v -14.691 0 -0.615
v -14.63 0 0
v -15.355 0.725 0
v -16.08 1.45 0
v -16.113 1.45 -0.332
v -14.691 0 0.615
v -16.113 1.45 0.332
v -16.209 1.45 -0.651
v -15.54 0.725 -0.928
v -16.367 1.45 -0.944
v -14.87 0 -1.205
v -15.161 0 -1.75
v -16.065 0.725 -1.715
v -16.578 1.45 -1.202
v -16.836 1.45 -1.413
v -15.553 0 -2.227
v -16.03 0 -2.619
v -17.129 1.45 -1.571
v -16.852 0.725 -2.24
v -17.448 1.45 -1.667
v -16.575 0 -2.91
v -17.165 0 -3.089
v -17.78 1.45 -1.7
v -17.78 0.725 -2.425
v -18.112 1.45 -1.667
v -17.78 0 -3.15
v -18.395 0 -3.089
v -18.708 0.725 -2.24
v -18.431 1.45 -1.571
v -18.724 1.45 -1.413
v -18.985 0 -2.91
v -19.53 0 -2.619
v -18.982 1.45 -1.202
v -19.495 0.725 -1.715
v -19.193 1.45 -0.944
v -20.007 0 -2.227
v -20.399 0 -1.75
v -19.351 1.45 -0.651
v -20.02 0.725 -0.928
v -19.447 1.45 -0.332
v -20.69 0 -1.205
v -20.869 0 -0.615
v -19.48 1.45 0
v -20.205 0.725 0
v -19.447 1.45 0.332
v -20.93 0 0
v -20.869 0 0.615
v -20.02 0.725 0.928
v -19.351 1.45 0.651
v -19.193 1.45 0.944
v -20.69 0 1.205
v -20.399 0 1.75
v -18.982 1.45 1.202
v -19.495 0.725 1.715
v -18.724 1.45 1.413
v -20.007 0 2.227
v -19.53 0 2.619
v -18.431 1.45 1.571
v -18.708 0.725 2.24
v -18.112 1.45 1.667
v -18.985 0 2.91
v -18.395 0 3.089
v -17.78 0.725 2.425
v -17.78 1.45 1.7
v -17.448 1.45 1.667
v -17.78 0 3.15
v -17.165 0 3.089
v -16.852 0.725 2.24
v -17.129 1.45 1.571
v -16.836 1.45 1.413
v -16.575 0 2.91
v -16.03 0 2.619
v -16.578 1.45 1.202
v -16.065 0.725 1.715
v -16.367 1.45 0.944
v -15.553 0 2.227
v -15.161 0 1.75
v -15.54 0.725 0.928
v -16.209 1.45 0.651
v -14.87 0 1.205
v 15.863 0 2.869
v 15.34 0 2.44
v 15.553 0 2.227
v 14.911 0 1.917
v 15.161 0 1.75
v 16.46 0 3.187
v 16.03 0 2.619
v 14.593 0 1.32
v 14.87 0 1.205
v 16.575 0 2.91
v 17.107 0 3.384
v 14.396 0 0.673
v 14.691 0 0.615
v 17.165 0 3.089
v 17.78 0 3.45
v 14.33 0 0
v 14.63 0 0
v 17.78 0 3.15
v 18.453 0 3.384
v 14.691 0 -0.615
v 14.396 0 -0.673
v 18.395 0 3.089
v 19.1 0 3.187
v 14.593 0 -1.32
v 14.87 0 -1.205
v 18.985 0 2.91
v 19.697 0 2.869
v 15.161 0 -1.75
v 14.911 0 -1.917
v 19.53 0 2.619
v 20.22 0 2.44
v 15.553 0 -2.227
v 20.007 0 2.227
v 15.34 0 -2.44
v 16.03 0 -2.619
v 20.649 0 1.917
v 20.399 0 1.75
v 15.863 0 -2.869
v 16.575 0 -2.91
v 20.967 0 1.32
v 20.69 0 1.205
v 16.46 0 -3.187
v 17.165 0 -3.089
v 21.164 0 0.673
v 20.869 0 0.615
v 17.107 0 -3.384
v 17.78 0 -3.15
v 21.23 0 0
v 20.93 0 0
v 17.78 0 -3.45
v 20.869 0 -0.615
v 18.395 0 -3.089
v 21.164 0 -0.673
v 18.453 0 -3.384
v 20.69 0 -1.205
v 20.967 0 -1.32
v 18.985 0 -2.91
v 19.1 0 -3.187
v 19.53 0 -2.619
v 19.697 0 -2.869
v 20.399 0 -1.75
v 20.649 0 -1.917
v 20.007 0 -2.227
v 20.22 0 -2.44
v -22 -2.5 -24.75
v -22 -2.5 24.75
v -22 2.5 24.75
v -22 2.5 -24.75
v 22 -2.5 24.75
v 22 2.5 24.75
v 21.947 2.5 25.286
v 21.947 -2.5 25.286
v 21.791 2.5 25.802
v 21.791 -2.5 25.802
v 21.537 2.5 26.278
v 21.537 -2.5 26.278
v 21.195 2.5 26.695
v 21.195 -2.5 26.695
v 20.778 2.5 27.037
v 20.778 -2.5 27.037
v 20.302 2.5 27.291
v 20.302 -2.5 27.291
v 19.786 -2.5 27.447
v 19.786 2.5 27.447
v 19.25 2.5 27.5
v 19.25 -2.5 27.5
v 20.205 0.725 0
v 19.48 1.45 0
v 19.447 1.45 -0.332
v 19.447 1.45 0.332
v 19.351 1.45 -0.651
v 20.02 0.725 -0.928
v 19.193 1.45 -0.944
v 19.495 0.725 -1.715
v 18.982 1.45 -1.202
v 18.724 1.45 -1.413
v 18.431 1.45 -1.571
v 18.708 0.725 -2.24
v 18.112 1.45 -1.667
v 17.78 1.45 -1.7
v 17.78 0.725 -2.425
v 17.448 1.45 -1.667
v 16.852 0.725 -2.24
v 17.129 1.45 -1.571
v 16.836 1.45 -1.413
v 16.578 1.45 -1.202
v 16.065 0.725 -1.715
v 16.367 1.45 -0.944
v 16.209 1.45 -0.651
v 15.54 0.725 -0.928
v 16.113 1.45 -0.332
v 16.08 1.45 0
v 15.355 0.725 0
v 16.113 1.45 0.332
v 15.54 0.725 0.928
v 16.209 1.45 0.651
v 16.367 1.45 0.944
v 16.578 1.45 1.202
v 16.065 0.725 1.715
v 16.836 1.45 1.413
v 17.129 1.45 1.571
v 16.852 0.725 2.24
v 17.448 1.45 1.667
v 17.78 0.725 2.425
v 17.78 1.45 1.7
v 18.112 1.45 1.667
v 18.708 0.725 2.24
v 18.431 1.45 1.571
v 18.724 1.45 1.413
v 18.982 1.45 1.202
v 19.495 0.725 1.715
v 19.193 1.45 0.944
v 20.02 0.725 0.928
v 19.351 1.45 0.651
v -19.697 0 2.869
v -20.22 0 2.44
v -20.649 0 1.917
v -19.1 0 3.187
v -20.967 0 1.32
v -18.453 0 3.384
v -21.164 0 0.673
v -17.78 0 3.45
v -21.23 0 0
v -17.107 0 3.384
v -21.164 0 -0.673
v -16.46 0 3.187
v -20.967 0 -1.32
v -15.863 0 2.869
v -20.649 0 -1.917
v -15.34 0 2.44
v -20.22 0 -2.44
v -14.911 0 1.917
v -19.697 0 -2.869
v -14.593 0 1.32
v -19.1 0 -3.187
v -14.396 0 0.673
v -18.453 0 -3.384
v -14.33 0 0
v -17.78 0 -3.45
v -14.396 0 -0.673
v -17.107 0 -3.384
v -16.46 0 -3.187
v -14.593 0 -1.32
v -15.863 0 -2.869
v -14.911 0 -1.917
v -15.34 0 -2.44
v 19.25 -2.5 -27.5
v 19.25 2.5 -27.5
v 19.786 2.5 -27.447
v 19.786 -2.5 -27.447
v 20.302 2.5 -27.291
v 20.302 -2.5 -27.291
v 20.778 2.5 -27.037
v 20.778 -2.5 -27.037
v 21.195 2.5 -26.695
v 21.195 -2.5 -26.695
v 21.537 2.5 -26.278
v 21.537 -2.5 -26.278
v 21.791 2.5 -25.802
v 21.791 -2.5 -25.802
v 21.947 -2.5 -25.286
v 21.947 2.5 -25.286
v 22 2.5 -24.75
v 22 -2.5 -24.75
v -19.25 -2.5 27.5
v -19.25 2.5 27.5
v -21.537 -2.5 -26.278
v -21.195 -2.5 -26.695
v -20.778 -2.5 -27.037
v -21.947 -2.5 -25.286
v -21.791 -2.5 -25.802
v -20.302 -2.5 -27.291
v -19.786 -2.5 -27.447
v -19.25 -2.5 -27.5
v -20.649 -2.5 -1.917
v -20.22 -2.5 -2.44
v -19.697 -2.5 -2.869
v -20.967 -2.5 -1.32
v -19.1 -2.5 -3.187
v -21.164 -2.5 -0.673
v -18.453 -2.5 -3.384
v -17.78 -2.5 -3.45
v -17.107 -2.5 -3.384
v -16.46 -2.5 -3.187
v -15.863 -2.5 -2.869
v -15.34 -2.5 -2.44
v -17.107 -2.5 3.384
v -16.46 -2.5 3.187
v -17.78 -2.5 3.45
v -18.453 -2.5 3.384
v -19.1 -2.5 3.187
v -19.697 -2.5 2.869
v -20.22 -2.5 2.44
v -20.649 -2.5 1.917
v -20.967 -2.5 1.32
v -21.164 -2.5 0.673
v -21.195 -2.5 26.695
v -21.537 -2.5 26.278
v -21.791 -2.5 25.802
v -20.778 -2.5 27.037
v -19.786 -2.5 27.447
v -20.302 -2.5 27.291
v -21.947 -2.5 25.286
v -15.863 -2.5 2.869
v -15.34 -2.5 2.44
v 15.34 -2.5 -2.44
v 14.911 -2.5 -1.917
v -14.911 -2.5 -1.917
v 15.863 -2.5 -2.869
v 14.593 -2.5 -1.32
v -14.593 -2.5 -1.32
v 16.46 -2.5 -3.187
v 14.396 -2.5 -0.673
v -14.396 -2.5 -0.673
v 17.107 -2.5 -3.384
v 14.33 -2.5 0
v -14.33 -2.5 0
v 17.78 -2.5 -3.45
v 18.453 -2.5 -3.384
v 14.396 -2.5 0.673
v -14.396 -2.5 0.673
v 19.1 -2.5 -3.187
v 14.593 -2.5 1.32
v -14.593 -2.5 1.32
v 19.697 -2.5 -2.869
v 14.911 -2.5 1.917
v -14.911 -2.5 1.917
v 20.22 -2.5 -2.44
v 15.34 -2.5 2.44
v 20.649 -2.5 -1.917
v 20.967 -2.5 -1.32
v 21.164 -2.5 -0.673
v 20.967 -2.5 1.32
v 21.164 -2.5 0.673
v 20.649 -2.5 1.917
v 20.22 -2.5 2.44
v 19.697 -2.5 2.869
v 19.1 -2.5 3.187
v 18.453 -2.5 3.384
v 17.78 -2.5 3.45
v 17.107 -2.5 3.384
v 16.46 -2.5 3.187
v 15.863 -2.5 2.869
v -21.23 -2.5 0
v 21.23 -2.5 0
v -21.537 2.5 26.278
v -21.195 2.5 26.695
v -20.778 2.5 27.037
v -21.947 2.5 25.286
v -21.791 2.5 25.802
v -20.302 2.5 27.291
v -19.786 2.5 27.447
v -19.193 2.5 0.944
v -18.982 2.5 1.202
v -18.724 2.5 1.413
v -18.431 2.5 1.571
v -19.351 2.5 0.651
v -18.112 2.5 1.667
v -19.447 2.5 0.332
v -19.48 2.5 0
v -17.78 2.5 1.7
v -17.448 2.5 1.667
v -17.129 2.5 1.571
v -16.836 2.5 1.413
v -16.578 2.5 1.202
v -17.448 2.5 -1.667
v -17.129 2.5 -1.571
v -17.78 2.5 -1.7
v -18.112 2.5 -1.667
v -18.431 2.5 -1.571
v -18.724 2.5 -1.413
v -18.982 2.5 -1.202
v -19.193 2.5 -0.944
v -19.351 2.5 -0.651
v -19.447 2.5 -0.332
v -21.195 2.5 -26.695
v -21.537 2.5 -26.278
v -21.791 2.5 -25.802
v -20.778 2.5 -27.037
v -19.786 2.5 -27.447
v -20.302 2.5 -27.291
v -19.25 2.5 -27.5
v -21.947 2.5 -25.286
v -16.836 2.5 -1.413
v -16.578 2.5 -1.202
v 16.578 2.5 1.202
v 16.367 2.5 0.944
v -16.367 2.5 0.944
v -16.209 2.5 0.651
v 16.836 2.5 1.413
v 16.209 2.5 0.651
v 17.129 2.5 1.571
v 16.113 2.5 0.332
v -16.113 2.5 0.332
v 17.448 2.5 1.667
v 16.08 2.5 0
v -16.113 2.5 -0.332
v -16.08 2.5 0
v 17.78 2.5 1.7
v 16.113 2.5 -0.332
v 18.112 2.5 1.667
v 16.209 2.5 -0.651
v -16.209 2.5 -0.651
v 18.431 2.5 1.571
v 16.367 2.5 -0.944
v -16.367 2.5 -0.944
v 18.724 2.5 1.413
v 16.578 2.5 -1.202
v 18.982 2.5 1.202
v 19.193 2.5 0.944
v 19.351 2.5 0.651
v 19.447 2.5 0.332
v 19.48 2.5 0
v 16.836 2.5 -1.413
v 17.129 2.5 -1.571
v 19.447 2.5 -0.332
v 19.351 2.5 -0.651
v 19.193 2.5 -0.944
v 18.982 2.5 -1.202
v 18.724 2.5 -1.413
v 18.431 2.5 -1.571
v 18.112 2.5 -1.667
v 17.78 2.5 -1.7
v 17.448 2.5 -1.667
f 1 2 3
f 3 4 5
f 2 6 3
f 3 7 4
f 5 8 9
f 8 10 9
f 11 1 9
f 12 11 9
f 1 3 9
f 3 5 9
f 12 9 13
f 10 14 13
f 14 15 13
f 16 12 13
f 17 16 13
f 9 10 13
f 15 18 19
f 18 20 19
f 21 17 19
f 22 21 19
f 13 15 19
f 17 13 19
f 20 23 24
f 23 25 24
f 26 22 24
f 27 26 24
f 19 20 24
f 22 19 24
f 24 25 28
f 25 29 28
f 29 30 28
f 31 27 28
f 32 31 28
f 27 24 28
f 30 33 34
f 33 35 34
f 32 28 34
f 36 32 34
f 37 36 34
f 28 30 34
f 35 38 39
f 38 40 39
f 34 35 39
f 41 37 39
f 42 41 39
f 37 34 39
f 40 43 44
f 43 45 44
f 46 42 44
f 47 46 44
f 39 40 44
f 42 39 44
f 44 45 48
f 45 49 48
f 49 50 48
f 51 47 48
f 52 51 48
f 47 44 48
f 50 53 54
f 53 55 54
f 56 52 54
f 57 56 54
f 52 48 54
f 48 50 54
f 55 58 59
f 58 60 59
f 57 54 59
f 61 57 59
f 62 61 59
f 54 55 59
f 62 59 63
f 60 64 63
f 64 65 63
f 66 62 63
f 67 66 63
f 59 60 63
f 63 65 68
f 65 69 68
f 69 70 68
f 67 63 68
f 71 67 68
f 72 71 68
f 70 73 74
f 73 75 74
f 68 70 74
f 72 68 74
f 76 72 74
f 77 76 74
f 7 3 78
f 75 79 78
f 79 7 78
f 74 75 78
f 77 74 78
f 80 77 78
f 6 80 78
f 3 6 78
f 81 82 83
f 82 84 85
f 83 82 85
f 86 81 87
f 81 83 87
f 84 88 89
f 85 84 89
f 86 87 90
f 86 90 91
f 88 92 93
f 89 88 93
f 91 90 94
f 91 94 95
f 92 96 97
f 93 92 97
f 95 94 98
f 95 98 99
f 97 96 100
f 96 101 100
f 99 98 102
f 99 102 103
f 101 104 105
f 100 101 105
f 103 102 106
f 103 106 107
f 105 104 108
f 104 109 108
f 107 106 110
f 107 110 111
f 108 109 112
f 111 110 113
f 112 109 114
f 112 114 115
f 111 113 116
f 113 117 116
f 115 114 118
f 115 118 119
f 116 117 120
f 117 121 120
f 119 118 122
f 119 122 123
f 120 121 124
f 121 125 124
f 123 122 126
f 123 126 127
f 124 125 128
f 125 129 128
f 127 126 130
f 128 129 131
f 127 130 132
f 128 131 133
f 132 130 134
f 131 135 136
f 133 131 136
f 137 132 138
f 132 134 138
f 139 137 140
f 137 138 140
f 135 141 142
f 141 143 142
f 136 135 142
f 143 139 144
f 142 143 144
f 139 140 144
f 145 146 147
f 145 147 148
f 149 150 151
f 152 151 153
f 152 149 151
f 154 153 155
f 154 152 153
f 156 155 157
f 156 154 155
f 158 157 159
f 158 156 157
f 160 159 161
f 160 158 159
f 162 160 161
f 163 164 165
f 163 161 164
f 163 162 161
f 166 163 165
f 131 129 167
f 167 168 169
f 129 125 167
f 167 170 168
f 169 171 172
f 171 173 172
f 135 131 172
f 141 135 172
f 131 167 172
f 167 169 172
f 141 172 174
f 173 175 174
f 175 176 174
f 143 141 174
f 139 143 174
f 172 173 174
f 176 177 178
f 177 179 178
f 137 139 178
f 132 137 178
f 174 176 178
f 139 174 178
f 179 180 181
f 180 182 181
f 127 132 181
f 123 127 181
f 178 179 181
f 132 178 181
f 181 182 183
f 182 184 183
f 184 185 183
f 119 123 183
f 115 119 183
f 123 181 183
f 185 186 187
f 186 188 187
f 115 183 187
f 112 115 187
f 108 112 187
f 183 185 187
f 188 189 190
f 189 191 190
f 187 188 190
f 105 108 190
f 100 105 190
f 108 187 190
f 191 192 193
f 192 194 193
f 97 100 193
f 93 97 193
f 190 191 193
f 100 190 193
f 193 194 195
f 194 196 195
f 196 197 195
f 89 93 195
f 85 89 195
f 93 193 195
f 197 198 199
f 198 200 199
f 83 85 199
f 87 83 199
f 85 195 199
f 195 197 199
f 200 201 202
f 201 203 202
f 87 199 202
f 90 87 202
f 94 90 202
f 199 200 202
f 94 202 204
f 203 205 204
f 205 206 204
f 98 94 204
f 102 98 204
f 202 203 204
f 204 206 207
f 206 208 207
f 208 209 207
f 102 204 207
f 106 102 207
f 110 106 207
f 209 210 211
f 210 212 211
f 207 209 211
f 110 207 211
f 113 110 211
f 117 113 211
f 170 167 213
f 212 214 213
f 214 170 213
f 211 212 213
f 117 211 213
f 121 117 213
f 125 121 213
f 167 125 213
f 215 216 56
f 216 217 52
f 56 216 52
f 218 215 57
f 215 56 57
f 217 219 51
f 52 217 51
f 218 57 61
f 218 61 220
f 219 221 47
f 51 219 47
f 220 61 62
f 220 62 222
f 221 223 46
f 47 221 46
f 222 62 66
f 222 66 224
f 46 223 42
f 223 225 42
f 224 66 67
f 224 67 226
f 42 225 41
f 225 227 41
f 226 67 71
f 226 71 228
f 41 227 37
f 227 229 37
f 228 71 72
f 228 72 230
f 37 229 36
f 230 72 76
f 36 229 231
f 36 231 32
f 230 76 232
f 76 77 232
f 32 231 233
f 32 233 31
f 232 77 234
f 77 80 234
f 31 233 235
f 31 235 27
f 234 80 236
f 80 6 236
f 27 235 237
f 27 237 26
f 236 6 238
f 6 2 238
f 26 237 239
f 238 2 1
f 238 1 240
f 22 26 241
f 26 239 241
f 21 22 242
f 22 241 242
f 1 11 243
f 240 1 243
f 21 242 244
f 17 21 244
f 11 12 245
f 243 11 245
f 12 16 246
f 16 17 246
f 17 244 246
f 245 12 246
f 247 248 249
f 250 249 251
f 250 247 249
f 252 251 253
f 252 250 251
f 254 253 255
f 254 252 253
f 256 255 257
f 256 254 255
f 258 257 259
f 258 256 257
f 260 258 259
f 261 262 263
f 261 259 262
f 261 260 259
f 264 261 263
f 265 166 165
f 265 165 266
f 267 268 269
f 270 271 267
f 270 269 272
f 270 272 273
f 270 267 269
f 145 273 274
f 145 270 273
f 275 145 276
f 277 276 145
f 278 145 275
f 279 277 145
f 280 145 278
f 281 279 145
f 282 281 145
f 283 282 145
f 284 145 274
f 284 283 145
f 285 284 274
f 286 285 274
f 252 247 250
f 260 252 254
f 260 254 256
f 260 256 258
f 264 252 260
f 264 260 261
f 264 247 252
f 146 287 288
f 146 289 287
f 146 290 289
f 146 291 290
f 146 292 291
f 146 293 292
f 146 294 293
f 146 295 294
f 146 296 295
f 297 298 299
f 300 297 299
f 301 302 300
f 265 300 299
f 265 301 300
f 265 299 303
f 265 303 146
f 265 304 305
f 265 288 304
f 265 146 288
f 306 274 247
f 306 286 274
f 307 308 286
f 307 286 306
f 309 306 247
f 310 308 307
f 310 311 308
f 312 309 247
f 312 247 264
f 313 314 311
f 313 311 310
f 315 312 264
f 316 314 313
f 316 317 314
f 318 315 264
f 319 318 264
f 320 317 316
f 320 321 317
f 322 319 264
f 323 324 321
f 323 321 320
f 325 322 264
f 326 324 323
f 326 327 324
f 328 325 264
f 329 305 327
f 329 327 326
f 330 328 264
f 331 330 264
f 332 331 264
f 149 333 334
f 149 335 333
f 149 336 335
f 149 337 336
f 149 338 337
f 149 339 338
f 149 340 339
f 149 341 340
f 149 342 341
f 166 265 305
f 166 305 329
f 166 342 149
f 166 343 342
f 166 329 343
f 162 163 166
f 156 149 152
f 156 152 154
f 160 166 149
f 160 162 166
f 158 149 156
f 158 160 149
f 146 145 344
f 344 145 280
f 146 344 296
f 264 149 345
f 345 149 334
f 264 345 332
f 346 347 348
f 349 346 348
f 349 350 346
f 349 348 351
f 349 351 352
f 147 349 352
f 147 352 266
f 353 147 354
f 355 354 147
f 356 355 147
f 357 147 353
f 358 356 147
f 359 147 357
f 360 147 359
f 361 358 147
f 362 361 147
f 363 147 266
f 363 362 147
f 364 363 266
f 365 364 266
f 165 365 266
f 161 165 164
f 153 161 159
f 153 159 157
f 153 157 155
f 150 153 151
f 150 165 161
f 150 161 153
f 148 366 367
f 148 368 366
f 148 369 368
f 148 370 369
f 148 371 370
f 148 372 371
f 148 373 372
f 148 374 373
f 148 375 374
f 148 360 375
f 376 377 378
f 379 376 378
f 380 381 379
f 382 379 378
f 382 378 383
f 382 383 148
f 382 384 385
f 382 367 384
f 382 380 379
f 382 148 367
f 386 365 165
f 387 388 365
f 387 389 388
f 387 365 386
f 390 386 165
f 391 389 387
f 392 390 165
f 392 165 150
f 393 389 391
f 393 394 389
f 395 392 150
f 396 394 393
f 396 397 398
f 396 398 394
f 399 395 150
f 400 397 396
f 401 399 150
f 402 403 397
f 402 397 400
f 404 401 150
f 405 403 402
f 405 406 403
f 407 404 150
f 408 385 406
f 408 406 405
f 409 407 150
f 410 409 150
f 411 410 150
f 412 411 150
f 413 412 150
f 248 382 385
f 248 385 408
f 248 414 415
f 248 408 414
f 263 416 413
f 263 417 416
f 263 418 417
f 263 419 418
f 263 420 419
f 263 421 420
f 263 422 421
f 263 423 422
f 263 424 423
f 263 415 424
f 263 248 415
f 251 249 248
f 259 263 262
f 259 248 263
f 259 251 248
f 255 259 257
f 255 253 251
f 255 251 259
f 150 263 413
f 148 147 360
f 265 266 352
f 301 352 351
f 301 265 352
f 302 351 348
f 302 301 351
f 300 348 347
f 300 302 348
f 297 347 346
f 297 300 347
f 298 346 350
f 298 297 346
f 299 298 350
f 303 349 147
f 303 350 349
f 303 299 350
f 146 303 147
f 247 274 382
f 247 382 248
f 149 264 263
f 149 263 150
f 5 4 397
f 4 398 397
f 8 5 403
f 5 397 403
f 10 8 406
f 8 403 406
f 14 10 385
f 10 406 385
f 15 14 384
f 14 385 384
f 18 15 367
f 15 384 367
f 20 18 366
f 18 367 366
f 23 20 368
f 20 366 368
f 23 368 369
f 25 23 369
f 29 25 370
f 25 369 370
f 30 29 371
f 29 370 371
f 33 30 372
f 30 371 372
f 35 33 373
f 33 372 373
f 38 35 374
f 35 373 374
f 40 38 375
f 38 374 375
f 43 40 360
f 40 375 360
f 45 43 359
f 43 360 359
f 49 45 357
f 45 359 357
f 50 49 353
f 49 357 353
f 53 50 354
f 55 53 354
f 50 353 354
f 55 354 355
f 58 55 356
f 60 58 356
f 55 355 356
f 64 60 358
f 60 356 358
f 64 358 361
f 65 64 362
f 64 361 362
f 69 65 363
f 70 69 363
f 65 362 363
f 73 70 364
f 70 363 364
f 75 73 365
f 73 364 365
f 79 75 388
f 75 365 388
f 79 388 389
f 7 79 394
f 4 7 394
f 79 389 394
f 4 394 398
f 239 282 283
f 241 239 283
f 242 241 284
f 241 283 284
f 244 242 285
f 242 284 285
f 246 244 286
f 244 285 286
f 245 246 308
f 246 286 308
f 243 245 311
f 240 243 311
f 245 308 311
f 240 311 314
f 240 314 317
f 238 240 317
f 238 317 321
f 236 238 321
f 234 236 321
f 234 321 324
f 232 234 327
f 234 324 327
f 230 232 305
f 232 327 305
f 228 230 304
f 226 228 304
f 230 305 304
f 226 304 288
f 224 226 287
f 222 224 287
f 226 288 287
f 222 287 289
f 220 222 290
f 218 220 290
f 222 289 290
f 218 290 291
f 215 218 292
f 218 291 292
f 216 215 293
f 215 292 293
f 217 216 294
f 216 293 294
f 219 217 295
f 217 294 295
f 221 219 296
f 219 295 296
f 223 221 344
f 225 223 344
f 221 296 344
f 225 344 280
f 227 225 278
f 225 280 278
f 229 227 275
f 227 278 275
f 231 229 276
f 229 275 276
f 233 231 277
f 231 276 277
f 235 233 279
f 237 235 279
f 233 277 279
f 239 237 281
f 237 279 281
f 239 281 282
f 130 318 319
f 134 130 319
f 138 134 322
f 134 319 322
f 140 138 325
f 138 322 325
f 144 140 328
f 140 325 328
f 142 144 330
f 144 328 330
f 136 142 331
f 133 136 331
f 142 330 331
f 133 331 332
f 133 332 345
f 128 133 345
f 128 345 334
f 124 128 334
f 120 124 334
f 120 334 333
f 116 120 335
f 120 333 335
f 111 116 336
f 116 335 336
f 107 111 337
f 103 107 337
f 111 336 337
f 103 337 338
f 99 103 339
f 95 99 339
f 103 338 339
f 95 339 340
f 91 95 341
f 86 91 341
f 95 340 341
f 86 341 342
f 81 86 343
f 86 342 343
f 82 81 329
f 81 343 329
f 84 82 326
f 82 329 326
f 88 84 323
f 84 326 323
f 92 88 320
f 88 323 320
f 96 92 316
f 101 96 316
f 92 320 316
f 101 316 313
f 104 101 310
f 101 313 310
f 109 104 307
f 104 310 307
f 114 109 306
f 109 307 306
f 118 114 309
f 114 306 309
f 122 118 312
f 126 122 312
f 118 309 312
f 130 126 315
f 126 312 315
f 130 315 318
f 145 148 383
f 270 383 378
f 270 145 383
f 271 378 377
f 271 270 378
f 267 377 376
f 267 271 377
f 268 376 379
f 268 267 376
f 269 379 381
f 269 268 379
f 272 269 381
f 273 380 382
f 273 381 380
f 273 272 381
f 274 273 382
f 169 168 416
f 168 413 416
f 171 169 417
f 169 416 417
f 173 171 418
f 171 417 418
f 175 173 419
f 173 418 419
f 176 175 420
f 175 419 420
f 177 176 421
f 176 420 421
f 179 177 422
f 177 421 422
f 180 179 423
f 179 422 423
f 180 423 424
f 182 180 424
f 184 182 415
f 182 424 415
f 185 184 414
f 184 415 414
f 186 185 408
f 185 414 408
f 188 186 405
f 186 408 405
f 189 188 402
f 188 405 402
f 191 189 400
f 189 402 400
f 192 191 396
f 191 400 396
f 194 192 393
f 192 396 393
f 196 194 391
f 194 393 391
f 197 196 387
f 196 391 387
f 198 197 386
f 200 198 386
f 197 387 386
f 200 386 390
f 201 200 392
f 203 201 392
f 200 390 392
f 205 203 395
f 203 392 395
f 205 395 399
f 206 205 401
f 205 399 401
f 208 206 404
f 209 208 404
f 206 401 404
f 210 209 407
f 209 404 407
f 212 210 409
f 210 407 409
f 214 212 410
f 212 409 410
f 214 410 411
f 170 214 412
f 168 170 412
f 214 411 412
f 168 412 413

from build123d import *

# Parameters (mm, degrees)
SKETCH1_R                                       = 1.5
BOSS_EXTRUDE1_DEPTH                             = 2.5
CSK_FOR_M3_FLAT_HEAD_MACHINE_SCREW1_D           = 3.4
CSK_FOR_M3_FLAT_HEAD_MACHINE_SCREW1_DEPTH       = 10
CSK_FOR_M3_FLAT_HEAD_MACHINE_SCREW1_CSINK_D     = 6.3
CSK_FOR_M3_FLAT_HEAD_MACHINE_SCREW1_CSINK_ANGLE = 90
CSK_FOR_M3_FLAT_HEAD_MACHINE_SCREW1_TIP         = 1.021463052
BOSS_EXTRUDE2_START                             = 2.5
SKETCH4_R                                       = 3.45
BOSS_EXTRUDE2_DEPTH                             = 2.5


with BuildPart() as part:
    # Sketch1 → Boss-Extrude1 (new body)
    with BuildSketch(Plane(origin=(0, 0, 0), x_dir=(1, 0, 0), z_dir=(0, 1, 0))):
        with BuildLine():
            Line((-19.25, -27.5), (19.25, -27.5))
            ThreePointArc((19.25, -27.5), (21.194543648, -26.694543648), (22, -24.75))
            Line((22, -24.75), (22, 24.75))
            ThreePointArc((22, 24.75), (21.194543648, 26.694543648), (19.25, 27.5))
            Line((19.25, 27.5), (-19.25, 27.5))
            ThreePointArc((-19.25, 27.5), (-21.194543648, 26.694543648), (-22, 24.75))
            Line((-22, 24.75), (-22, -24.75))
            ThreePointArc((-22, -24.75), (-21.194543648, -26.694543648), (-19.25, -27.5))
        make_face()
        with Locations(Location((-17.78, 0, 0), (0, 0, 270))):
            Circle(SKETCH1_R, mode=Mode.SUBTRACT)
        with Locations(Location((17.78, 0, 0), (0, 0, 90))):
            Circle(SKETCH1_R, mode=Mode.SUBTRACT)
    extrude(amount=BOSS_EXTRUDE1_DEPTH)

    # CSK for M3 Flat Head Machine Screw1
    with Locations(Plane(origin=(0, 0, 0), x_dir=(-1, 0, 0), z_dir=(0, -1, 0))):
        with Locations((-17.78, 0), (17.78, 0)):
            CounterSinkHole(CSK_FOR_M3_FLAT_HEAD_MACHINE_SCREW1_D / 2, CSK_FOR_M3_FLAT_HEAD_MACHINE_SCREW1_CSINK_D / 2, depth=CSK_FOR_M3_FLAT_HEAD_MACHINE_SCREW1_DEPTH, counter_sink_angle=CSK_FOR_M3_FLAT_HEAD_MACHINE_SCREW1_CSINK_ANGLE)
            with Locations((0, 0, -(CSK_FOR_M3_FLAT_HEAD_MACHINE_SCREW1_DEPTH + CSK_FOR_M3_FLAT_HEAD_MACHINE_SCREW1_TIP / 2))):  # 118° drill point
                Cone(0, CSK_FOR_M3_FLAT_HEAD_MACHINE_SCREW1_D / 2, CSK_FOR_M3_FLAT_HEAD_MACHINE_SCREW1_TIP, mode=Mode.SUBTRACT)

    # Sketch4 → Boss-Extrude2 (add)
    with BuildSketch(Plane.XZ.offset(BOSS_EXTRUDE2_START)):
        with BuildLine():
            Line((-22, 24.75), (-22, -24.75))
            ThreePointArc((-22, -24.75), (-21.194543648, -26.694543648), (-19.25, -27.5))
            Line((-19.25, -27.5), (19.25, -27.5))
            ThreePointArc((19.25, -27.5), (21.194543648, -26.694543648), (22, -24.75))
            Line((22, -24.75), (22, 24.75))
            ThreePointArc((22, 24.75), (21.194543648, 26.694543648), (19.25, 27.5))
            Line((19.25, 27.5), (-19.25, 27.5))
            ThreePointArc((-19.25, 27.5), (-21.194543648, 26.694543648), (-22, 24.75))
        make_face()
        with Locations(Location((-17.78, 0, 0), (0, 0, 270))):
            Circle(SKETCH4_R, mode=Mode.SUBTRACT)
        with Locations(Location((17.78, 0, 0), (0, 0, 270))):
            Circle(SKETCH4_R, mode=Mode.SUBTRACT)
    extrude(amount=-BOSS_EXTRUDE2_DEPTH)


solid = part.part
